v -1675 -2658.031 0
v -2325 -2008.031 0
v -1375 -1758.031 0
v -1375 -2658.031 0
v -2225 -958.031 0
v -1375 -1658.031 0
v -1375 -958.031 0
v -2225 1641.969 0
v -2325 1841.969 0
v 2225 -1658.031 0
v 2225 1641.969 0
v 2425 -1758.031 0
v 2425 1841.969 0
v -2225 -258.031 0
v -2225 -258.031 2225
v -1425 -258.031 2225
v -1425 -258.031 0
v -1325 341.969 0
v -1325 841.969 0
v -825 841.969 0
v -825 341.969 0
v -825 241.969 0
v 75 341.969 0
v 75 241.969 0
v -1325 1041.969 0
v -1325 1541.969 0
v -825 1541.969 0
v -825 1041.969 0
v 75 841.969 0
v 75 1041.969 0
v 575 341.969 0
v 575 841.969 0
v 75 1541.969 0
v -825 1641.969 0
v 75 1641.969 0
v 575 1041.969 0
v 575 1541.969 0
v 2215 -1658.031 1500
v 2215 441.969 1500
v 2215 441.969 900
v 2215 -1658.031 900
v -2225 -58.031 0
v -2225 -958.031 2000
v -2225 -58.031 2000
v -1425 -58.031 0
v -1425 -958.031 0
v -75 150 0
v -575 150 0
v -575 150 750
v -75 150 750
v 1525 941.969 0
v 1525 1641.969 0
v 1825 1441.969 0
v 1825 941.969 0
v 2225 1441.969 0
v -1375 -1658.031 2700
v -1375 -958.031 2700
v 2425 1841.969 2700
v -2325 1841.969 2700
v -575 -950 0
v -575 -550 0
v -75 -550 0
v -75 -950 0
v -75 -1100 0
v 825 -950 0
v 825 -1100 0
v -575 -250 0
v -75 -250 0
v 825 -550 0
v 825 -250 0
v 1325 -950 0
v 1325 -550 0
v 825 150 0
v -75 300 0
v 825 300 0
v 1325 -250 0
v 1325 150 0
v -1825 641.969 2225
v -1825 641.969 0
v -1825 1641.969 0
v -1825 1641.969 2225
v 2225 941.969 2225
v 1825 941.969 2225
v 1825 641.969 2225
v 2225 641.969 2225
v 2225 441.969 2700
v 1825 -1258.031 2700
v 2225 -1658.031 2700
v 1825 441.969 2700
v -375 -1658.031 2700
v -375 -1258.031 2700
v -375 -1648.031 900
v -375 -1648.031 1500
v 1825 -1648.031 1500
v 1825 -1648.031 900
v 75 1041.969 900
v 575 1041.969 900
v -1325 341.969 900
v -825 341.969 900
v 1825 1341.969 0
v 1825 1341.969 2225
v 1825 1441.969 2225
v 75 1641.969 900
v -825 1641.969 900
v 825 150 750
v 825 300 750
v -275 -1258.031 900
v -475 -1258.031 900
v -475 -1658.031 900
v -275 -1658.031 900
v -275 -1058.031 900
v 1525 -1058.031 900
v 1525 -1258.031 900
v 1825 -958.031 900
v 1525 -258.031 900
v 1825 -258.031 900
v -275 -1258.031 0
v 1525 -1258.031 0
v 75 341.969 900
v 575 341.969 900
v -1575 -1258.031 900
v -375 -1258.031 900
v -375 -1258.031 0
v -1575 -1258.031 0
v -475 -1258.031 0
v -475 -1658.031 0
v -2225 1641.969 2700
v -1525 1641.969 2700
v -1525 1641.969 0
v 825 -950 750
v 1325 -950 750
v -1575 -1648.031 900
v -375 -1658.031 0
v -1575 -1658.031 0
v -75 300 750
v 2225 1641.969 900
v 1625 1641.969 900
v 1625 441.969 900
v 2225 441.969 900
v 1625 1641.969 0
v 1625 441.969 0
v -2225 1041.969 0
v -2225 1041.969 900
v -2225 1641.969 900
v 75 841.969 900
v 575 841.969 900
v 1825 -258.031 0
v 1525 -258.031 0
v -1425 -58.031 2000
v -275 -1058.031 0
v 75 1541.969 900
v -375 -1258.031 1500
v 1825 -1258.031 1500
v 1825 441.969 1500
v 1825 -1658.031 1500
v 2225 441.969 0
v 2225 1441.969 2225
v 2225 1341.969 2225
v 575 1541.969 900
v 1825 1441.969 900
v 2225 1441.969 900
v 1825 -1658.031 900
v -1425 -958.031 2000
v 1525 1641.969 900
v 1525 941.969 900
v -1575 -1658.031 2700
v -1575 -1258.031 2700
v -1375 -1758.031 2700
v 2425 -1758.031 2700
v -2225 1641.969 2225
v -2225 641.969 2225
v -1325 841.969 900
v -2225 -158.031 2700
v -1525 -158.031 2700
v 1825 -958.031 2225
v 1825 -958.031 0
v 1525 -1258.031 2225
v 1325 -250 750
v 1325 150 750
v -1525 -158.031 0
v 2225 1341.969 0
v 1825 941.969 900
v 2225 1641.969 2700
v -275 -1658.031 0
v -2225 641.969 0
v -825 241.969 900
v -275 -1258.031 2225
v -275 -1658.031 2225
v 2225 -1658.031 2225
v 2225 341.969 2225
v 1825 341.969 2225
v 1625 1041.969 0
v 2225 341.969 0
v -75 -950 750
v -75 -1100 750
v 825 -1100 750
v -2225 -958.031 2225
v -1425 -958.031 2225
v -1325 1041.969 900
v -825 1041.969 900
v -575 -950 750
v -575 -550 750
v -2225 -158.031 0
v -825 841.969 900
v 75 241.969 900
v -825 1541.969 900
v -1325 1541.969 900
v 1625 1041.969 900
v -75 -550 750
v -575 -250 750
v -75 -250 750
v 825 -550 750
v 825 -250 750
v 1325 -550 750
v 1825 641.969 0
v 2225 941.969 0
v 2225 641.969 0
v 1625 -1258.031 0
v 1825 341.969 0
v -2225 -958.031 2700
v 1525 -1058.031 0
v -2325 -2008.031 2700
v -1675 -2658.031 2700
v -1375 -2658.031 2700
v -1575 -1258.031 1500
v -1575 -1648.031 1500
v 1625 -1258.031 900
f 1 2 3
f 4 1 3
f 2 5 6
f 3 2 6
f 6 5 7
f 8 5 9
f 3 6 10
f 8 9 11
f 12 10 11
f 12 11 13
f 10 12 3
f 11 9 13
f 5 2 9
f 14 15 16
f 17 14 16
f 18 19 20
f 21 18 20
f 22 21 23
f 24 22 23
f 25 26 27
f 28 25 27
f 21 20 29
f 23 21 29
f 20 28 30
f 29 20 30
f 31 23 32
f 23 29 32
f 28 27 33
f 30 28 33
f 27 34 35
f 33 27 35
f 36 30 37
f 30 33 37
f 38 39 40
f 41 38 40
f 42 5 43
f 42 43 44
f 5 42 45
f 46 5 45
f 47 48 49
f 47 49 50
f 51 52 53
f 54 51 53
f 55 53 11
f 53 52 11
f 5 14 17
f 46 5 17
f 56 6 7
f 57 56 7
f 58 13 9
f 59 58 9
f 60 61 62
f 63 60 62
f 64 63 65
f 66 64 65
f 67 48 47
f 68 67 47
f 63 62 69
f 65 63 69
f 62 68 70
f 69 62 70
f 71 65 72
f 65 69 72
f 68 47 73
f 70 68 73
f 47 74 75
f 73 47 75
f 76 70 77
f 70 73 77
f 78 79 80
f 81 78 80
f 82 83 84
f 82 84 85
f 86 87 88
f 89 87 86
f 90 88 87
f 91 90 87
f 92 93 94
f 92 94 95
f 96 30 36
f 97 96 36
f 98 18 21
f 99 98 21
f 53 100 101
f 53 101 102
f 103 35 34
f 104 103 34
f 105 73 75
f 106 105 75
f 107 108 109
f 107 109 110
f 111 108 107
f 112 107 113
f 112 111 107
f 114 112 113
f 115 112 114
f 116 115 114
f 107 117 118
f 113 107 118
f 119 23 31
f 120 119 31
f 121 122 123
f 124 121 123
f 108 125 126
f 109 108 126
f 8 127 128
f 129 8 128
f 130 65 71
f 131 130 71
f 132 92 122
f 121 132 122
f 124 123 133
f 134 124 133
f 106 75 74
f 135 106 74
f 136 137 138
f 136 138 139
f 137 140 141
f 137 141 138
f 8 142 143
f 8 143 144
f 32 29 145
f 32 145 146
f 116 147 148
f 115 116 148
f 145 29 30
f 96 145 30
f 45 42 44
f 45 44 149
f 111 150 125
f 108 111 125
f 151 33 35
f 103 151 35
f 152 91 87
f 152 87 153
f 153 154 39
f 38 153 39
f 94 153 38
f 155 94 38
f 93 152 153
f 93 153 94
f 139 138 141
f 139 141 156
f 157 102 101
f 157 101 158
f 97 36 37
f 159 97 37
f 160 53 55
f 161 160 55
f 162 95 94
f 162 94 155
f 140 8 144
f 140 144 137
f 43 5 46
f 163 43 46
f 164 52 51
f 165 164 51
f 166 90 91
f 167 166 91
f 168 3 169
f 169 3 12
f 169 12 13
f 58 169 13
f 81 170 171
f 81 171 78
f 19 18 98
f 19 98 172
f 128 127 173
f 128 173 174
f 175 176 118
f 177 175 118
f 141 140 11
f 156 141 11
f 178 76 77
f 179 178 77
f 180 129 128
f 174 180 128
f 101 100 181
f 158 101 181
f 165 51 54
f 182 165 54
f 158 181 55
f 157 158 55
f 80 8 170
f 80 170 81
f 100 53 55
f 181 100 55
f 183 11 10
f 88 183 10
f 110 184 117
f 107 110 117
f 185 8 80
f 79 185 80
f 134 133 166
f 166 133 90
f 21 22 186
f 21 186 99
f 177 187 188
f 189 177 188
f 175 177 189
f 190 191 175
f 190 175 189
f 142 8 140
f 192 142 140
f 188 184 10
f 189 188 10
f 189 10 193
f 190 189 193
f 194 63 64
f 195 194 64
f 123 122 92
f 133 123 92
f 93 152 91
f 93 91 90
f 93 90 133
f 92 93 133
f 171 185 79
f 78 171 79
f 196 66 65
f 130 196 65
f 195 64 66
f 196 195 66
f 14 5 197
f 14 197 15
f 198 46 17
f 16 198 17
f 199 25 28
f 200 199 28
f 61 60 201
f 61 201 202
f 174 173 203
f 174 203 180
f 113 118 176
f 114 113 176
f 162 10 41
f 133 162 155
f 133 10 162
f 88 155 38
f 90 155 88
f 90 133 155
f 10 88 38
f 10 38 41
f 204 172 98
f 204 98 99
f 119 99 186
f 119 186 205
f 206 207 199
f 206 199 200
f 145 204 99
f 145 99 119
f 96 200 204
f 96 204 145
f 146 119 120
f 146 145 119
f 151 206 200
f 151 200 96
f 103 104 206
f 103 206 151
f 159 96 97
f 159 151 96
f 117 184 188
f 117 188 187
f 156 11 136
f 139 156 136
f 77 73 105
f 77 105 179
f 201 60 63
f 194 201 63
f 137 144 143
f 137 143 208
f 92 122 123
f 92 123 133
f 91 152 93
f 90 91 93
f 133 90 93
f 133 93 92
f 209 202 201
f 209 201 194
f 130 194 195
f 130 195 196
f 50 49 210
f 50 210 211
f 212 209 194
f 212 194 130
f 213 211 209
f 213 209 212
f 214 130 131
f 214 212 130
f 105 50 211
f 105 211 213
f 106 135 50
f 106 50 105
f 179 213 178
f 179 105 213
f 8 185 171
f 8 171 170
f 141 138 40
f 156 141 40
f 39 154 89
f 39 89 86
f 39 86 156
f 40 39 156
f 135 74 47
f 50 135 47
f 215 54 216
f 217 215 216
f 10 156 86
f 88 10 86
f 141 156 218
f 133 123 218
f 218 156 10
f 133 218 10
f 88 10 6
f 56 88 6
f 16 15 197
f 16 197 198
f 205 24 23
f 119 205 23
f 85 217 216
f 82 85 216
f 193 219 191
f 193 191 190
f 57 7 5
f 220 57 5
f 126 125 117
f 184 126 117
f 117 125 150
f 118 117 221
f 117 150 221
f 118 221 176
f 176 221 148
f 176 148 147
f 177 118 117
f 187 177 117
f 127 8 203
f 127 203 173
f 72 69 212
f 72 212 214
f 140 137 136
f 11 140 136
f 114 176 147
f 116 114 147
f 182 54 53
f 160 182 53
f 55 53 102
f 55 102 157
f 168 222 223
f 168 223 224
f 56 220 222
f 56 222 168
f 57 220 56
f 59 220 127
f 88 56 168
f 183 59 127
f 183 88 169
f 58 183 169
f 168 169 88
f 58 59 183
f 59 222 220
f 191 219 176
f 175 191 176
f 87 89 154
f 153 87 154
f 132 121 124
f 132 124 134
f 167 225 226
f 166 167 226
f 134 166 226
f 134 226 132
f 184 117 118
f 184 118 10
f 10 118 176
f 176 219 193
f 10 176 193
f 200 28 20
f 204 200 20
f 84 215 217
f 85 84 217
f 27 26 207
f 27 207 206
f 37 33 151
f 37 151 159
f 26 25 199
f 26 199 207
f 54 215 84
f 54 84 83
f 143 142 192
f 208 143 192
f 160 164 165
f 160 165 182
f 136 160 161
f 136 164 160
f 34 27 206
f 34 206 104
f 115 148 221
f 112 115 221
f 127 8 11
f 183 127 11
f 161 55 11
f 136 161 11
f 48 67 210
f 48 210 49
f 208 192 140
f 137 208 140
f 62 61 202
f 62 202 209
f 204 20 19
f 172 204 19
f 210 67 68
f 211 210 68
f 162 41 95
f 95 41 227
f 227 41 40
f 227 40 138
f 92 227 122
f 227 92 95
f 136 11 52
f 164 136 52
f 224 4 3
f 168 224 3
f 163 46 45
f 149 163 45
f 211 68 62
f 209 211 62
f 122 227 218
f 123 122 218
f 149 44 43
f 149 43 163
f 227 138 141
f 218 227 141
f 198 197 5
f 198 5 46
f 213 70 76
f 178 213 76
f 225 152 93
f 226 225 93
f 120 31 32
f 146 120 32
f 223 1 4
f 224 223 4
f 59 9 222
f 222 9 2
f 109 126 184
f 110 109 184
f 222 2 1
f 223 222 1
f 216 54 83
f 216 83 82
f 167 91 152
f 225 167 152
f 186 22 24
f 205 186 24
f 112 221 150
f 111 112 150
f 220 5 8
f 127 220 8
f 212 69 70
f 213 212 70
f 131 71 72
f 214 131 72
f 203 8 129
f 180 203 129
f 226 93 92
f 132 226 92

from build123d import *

# Parameters (mm, degrees)
F1_DEPTH       = 2700
F2_W           = 700
F2_H           = 2700
F3_DEPTH       = 1800
F4_W           = 500
F4_H           = 400
F5_DEPTH       = 750
F6_W           = 600
F6_H           = 900
F7_DEPTH       = 1200
F9_DEPTH       = 2100
F11_DEPTH      = 2000
F11_DEPTH_BACK = 200
F13_DEPTH      = 1200
F14_W          = 3850
F14_H          = 600
F15_DEPTH      = 900
F14_W_2        = 800
F14_H_2        = 900
F16_DEPTH      = 2000
F17_W          = 400
F17_H          = 400
F17_W_2        = 900
F17_W_3        = 500
F17_H_2        = 700
F17_H_3        = 100
F17_H_4        = 500
F18_DEPTH      = 2225
F17_H_5        = 300
F17_W_4        = 800
F17_H_6        = 1000
F17_W_5        = 450
F19_DEPTH      = 900
F17_W_6        = 300
F17_H_7        = 200


with BuildPart() as f1:
    # F0 (on Top) → F1 (new body)
    with BuildSketch(Plane.XY):
        Polygon((-1375, -2658.0309391022), (-1375, -1758.0309391022), (2425, -1758.0309391022), (2425, 1841.9690608978), (-2325, 1841.9690608978), (-2325, -2008.0309391022), (-1675, -2658.0309391022), align=None)
        Polygon((-2225, -958.0309391022), (-2225, 1641.9690608978), (2225, 1641.9690608978), (2225, -1658.0309391022), (-1375, -1658.0309391022), (-1375, -958.0309391022), align=None, mode=Mode.SUBTRACT)
    extrude(amount=F1_DEPTH)


with BuildPart() as f3:
    # F2 (on face) → F3 (new body)
    with BuildSketch(Plane.XZ.offset(-1641.9690608978)):
        with Locations((-1875, 1350)):
            Rectangle(F2_W, F2_H)
    extrude(amount=F3_DEPTH)


with BuildPart() as f5:
    # F4 (on Top) → F5 (new body)
    with BuildSketch(Plane.XY):
        with Locations((-325, -50)):
            Rectangle(F4_W, F4_H)
        Polygon((825, 300), (-75, 300), (-75, 150), (-75, -250), (-75, -400), (825, -400), (825, -250), (825, 150), align=None)
        with Locations((1075, -50)):
            Rectangle(F4_W, F4_H)
        Polygon((825, -400), (-75, -400), (-75, -550), (-75, -950), (-75, -1100), (825, -1100), (825, -950), (825, -550), align=None)
        with Locations((-325, -750)):
            Rectangle(F4_W, F4_H)
        with Locations((1075, -750)):
            Rectangle(F4_W, F4_H)
    extrude(amount=F5_DEPTH)


with BuildPart() as f7:
    # F6 (on face) → F7 (new body)
    with BuildSketch(Plane.XZ.offset(-1641.9690608978)):
        with Locations((1925, 450)):
            Rectangle(F6_W, F6_H)
    extrude(amount=F7_DEPTH)


with BuildPart() as f9:
    # F8 (on face) → F9 (new body, through all)
    with BuildSketch(Plane.XZ.offset(-441.9690608978)):
        Polygon((2215, 900), (2225, 900), (2225, 2700), (1825, 2700), (1825, 1500), (2215, 1500), align=None)
        Polygon((1625, 0), (2225, 0), (2225, 900), (2215, 900), (1625, 900), align=None)
    extrude(amount=F9_DEPTH)

    # F10 (on face) → F11 (join, two sides)
    with BuildSketch(Plane(origin=(1625, 0, 0), x_dir=(0, -1, 0), z_dir=(-1, 0, 0))) as f11_sk:
        Polygon((1648.0309391022, 900), (1658.0309391022, 900), (1658.0309391022, 2700), (1258.0309391022, 2700), (1258.0309391022, 1500), (1648.0309391022, 1500), align=None)
        Polygon((1258.0309391022, 0), (1658.0309391022, 0), (1658.0309391022, 900), (1648.0309391022, 900), (1258.0309391022, 900), align=None)
    extrude(amount=F11_DEPTH)
    extrude(f11_sk.sketch, amount=-F11_DEPTH_BACK)


with BuildPart() as f13:
    # F12 (on face) → F13 (new body)
    with BuildSketch(Plane(origin=(-375, 0, 0), x_dir=(0, -1, 0), z_dir=(-1, 0, 0))):
        Polygon((1658.0309391022, 0), (1658.0309391022, 2700), (1258.0309391022, 2700), (1258.0309391022, 1500), (1648.0309391022, 1500), (1648.0309391022, 900), (1258.0309391022, 900), (1258.0309391022, 0), align=None)
    extrude(amount=F13_DEPTH)


with BuildPart() as f15:
    # F14 (on Top) → F15 (new body)
    with BuildSketch(Plane.XY):
        with Locations((-300, 1341.9690608978)):
            Rectangle(F14_W, F14_H)
    extrude(amount=F15_DEPTH)


with BuildPart() as f16:
    # F14 (on Top) → F16 (new body)
    with BuildSketch(Plane.XY):
        with Locations((-1825, -508.0309391022)):
            Rectangle(F14_W_2, F14_H_2)
    extrude(amount=F16_DEPTH)


with BuildPart() as f18:
    # F17 (on Top) → F18 (new body)
    with BuildSketch(Plane.XY):
        with Locations((-75, -1458.0309391022)):
            Rectangle(F17_W, F17_H)
        with Locations((575, -1458.0309391022)):
            Rectangle(F17_W_2, F17_H)
        with Locations((1275, -1458.0309391022)):
            Rectangle(F17_W_3, F17_H)
        Polygon((1725, -1058.0309391022), (1525, -1258.0309391022), (1525, -1658.0309391022), (2225, -1658.0309391022), (2225, -1058.0309391022), align=None)
        Polygon((1825, -958.0309391022), (1725, -1058.0309391022), (2225, -1058.0309391022), (2225, -958.0309391022), align=None)
        with Locations((2025, -608.0309391022)):
            Rectangle(F17_W, F17_H_2)
        with Locations((2025, -208.0309391022)):
            Rectangle(F17_W, F17_H_3)
        with Locations((2025, 91.9690608978)):
            Rectangle(F17_W, F17_H_4)
    extrude(amount=F18_DEPTH)


with BuildPart() as f18b:
    # F17 (on Top) → F18, piece 2 (new body)
    with BuildSketch(Plane.XY):
        with Locations((2025, 791.9690608978)):
            Rectangle(F17_W, F17_H_5)
    extrude(amount=F18_DEPTH)


with BuildPart() as f18c:
    # F17 (on Top) → F18, piece 3 (new body)
    with BuildSketch(Plane.XY):
        with Locations((2025, 1391.9690608978)):
            Rectangle(F17_W, F17_H_3)
    extrude(amount=F18_DEPTH)


with BuildPart() as f18d:
    # F17 (on Top) → F18, piece 4 (new body)
    with BuildSketch(Plane.XY):
        with Locations((-1825, -608.0309391022)):
            Rectangle(F17_W_4, F17_H_2)
    extrude(amount=F18_DEPTH)


with BuildPart() as f18e:
    # F17 (on Top) → F18, piece 5 (new body)
    with BuildSketch(Plane.XY):
        with Locations((-2025, 1141.9690608978)):
            Rectangle(F17_W, F17_H_6)
    extrude(amount=F18_DEPTH)


with BuildPart() as f19:
    # F17 (on Top) → F19 (new body)
    with BuildSketch(Plane.XY):
        with Locations((-1075, 1291.9690608978)):
            Rectangle(F17_W_3, F17_H_4)
        with Locations((-600, 1591.9690608978)):
            Rectangle(F17_W_5, F17_H_3)
        with Locations((-150, 1591.9690608978)):
            Rectangle(F17_W_5, F17_H_3)
        with Locations((-150, 1291.9690608978)):
            Rectangle(F17_W_5, F17_H_4)
        with Locations((325, 1291.9690608978)):
            Rectangle(F17_W_3, F17_H_4)
        with Locations((-600, 1291.9690608978)):
            Rectangle(F17_W_5, F17_H_4)
        with Locations((-1075, 591.9690608978)):
            Rectangle(F17_W_3, F17_H_4)
        with Locations((-600, 591.9690608978)):
            Rectangle(F17_W_5, F17_H_4)
        with Locations((-600, 291.9690608978)):
            Rectangle(F17_W_5, F17_H_3)
        with Locations((-150, 991.9690608978)):
            Rectangle(F17_W_5, F17_H_3)
        with Locations((-600, 891.9690608978)):
            Rectangle(F17_W_5, F17_H_3)
        with Locations((-600, 991.9690608978)):
            Rectangle(F17_W_5, F17_H_3)
        with Locations((-150, 891.9690608978)):
            Rectangle(F17_W_5, F17_H_3)
        with Locations((-150, 591.9690608978)):
            Rectangle(F17_W_5, F17_H_4)
        with Locations((325, 591.9690608978)):
            Rectangle(F17_W_3, F17_H_4)
        with Locations((-150, 291.9690608978)):
            Rectangle(F17_W_5, F17_H_3)
    extrude(amount=F19_DEPTH)


with BuildPart() as f19b:
    # F17 (on Top) → F19, piece 2 (new body)
    with BuildSketch(Plane.XY):
        Polygon((1525, 1641.9690608978), (1525, 1441.9690608978), (1825, 1441.9690608978), (2225, 1441.9690608978), (2225, 1641.9690608978), align=None)
        with Locations((1675, 1391.9690608978)):
            Rectangle(F17_W_6, F17_H_3)
        with Locations((1675, 1141.9690608978)):
            Rectangle(F17_W_6, F17_H)
    extrude(amount=F19_DEPTH)


with BuildPart() as f19c:
    # F17 (on Top) → F19, piece 3 (new body)
    with BuildSketch(Plane.XY):
        Polygon((1525, -258.0309391022), (1525, -1058.0309391022), (1725, -1058.0309391022), (1825, -958.0309391022), (1825, -258.0309391022), align=None)
        Polygon((1525, -1058.0309391022), (1025, -1058.0309391022), (1025, -1258.0309391022), (1525, -1258.0309391022), (1725, -1058.0309391022), align=None)
        with Locations((575, -1158.0309391022)):
            Rectangle(F17_W_2, F17_H_7)
        with Locations((-75, -1158.0309391022)):
            Rectangle(F17_W, F17_H_7)
        Polygon((-275, -1258.0309391022), (-275, -1058.0309391022), (-475, -1258.0309391022), (-475, -1658.0309391022), (-275, -1658.0309391022), align=None)
    extrude(amount=F19_DEPTH)


solid = Compound([f1.part, f3.part, f5.part, f7.part, f9.part, f13.part, f15.part, f16.part, f18.part, f18b.part, f18c.part, f18d.part, f18e.part, f19.part, f19b.part, f19c.part])
